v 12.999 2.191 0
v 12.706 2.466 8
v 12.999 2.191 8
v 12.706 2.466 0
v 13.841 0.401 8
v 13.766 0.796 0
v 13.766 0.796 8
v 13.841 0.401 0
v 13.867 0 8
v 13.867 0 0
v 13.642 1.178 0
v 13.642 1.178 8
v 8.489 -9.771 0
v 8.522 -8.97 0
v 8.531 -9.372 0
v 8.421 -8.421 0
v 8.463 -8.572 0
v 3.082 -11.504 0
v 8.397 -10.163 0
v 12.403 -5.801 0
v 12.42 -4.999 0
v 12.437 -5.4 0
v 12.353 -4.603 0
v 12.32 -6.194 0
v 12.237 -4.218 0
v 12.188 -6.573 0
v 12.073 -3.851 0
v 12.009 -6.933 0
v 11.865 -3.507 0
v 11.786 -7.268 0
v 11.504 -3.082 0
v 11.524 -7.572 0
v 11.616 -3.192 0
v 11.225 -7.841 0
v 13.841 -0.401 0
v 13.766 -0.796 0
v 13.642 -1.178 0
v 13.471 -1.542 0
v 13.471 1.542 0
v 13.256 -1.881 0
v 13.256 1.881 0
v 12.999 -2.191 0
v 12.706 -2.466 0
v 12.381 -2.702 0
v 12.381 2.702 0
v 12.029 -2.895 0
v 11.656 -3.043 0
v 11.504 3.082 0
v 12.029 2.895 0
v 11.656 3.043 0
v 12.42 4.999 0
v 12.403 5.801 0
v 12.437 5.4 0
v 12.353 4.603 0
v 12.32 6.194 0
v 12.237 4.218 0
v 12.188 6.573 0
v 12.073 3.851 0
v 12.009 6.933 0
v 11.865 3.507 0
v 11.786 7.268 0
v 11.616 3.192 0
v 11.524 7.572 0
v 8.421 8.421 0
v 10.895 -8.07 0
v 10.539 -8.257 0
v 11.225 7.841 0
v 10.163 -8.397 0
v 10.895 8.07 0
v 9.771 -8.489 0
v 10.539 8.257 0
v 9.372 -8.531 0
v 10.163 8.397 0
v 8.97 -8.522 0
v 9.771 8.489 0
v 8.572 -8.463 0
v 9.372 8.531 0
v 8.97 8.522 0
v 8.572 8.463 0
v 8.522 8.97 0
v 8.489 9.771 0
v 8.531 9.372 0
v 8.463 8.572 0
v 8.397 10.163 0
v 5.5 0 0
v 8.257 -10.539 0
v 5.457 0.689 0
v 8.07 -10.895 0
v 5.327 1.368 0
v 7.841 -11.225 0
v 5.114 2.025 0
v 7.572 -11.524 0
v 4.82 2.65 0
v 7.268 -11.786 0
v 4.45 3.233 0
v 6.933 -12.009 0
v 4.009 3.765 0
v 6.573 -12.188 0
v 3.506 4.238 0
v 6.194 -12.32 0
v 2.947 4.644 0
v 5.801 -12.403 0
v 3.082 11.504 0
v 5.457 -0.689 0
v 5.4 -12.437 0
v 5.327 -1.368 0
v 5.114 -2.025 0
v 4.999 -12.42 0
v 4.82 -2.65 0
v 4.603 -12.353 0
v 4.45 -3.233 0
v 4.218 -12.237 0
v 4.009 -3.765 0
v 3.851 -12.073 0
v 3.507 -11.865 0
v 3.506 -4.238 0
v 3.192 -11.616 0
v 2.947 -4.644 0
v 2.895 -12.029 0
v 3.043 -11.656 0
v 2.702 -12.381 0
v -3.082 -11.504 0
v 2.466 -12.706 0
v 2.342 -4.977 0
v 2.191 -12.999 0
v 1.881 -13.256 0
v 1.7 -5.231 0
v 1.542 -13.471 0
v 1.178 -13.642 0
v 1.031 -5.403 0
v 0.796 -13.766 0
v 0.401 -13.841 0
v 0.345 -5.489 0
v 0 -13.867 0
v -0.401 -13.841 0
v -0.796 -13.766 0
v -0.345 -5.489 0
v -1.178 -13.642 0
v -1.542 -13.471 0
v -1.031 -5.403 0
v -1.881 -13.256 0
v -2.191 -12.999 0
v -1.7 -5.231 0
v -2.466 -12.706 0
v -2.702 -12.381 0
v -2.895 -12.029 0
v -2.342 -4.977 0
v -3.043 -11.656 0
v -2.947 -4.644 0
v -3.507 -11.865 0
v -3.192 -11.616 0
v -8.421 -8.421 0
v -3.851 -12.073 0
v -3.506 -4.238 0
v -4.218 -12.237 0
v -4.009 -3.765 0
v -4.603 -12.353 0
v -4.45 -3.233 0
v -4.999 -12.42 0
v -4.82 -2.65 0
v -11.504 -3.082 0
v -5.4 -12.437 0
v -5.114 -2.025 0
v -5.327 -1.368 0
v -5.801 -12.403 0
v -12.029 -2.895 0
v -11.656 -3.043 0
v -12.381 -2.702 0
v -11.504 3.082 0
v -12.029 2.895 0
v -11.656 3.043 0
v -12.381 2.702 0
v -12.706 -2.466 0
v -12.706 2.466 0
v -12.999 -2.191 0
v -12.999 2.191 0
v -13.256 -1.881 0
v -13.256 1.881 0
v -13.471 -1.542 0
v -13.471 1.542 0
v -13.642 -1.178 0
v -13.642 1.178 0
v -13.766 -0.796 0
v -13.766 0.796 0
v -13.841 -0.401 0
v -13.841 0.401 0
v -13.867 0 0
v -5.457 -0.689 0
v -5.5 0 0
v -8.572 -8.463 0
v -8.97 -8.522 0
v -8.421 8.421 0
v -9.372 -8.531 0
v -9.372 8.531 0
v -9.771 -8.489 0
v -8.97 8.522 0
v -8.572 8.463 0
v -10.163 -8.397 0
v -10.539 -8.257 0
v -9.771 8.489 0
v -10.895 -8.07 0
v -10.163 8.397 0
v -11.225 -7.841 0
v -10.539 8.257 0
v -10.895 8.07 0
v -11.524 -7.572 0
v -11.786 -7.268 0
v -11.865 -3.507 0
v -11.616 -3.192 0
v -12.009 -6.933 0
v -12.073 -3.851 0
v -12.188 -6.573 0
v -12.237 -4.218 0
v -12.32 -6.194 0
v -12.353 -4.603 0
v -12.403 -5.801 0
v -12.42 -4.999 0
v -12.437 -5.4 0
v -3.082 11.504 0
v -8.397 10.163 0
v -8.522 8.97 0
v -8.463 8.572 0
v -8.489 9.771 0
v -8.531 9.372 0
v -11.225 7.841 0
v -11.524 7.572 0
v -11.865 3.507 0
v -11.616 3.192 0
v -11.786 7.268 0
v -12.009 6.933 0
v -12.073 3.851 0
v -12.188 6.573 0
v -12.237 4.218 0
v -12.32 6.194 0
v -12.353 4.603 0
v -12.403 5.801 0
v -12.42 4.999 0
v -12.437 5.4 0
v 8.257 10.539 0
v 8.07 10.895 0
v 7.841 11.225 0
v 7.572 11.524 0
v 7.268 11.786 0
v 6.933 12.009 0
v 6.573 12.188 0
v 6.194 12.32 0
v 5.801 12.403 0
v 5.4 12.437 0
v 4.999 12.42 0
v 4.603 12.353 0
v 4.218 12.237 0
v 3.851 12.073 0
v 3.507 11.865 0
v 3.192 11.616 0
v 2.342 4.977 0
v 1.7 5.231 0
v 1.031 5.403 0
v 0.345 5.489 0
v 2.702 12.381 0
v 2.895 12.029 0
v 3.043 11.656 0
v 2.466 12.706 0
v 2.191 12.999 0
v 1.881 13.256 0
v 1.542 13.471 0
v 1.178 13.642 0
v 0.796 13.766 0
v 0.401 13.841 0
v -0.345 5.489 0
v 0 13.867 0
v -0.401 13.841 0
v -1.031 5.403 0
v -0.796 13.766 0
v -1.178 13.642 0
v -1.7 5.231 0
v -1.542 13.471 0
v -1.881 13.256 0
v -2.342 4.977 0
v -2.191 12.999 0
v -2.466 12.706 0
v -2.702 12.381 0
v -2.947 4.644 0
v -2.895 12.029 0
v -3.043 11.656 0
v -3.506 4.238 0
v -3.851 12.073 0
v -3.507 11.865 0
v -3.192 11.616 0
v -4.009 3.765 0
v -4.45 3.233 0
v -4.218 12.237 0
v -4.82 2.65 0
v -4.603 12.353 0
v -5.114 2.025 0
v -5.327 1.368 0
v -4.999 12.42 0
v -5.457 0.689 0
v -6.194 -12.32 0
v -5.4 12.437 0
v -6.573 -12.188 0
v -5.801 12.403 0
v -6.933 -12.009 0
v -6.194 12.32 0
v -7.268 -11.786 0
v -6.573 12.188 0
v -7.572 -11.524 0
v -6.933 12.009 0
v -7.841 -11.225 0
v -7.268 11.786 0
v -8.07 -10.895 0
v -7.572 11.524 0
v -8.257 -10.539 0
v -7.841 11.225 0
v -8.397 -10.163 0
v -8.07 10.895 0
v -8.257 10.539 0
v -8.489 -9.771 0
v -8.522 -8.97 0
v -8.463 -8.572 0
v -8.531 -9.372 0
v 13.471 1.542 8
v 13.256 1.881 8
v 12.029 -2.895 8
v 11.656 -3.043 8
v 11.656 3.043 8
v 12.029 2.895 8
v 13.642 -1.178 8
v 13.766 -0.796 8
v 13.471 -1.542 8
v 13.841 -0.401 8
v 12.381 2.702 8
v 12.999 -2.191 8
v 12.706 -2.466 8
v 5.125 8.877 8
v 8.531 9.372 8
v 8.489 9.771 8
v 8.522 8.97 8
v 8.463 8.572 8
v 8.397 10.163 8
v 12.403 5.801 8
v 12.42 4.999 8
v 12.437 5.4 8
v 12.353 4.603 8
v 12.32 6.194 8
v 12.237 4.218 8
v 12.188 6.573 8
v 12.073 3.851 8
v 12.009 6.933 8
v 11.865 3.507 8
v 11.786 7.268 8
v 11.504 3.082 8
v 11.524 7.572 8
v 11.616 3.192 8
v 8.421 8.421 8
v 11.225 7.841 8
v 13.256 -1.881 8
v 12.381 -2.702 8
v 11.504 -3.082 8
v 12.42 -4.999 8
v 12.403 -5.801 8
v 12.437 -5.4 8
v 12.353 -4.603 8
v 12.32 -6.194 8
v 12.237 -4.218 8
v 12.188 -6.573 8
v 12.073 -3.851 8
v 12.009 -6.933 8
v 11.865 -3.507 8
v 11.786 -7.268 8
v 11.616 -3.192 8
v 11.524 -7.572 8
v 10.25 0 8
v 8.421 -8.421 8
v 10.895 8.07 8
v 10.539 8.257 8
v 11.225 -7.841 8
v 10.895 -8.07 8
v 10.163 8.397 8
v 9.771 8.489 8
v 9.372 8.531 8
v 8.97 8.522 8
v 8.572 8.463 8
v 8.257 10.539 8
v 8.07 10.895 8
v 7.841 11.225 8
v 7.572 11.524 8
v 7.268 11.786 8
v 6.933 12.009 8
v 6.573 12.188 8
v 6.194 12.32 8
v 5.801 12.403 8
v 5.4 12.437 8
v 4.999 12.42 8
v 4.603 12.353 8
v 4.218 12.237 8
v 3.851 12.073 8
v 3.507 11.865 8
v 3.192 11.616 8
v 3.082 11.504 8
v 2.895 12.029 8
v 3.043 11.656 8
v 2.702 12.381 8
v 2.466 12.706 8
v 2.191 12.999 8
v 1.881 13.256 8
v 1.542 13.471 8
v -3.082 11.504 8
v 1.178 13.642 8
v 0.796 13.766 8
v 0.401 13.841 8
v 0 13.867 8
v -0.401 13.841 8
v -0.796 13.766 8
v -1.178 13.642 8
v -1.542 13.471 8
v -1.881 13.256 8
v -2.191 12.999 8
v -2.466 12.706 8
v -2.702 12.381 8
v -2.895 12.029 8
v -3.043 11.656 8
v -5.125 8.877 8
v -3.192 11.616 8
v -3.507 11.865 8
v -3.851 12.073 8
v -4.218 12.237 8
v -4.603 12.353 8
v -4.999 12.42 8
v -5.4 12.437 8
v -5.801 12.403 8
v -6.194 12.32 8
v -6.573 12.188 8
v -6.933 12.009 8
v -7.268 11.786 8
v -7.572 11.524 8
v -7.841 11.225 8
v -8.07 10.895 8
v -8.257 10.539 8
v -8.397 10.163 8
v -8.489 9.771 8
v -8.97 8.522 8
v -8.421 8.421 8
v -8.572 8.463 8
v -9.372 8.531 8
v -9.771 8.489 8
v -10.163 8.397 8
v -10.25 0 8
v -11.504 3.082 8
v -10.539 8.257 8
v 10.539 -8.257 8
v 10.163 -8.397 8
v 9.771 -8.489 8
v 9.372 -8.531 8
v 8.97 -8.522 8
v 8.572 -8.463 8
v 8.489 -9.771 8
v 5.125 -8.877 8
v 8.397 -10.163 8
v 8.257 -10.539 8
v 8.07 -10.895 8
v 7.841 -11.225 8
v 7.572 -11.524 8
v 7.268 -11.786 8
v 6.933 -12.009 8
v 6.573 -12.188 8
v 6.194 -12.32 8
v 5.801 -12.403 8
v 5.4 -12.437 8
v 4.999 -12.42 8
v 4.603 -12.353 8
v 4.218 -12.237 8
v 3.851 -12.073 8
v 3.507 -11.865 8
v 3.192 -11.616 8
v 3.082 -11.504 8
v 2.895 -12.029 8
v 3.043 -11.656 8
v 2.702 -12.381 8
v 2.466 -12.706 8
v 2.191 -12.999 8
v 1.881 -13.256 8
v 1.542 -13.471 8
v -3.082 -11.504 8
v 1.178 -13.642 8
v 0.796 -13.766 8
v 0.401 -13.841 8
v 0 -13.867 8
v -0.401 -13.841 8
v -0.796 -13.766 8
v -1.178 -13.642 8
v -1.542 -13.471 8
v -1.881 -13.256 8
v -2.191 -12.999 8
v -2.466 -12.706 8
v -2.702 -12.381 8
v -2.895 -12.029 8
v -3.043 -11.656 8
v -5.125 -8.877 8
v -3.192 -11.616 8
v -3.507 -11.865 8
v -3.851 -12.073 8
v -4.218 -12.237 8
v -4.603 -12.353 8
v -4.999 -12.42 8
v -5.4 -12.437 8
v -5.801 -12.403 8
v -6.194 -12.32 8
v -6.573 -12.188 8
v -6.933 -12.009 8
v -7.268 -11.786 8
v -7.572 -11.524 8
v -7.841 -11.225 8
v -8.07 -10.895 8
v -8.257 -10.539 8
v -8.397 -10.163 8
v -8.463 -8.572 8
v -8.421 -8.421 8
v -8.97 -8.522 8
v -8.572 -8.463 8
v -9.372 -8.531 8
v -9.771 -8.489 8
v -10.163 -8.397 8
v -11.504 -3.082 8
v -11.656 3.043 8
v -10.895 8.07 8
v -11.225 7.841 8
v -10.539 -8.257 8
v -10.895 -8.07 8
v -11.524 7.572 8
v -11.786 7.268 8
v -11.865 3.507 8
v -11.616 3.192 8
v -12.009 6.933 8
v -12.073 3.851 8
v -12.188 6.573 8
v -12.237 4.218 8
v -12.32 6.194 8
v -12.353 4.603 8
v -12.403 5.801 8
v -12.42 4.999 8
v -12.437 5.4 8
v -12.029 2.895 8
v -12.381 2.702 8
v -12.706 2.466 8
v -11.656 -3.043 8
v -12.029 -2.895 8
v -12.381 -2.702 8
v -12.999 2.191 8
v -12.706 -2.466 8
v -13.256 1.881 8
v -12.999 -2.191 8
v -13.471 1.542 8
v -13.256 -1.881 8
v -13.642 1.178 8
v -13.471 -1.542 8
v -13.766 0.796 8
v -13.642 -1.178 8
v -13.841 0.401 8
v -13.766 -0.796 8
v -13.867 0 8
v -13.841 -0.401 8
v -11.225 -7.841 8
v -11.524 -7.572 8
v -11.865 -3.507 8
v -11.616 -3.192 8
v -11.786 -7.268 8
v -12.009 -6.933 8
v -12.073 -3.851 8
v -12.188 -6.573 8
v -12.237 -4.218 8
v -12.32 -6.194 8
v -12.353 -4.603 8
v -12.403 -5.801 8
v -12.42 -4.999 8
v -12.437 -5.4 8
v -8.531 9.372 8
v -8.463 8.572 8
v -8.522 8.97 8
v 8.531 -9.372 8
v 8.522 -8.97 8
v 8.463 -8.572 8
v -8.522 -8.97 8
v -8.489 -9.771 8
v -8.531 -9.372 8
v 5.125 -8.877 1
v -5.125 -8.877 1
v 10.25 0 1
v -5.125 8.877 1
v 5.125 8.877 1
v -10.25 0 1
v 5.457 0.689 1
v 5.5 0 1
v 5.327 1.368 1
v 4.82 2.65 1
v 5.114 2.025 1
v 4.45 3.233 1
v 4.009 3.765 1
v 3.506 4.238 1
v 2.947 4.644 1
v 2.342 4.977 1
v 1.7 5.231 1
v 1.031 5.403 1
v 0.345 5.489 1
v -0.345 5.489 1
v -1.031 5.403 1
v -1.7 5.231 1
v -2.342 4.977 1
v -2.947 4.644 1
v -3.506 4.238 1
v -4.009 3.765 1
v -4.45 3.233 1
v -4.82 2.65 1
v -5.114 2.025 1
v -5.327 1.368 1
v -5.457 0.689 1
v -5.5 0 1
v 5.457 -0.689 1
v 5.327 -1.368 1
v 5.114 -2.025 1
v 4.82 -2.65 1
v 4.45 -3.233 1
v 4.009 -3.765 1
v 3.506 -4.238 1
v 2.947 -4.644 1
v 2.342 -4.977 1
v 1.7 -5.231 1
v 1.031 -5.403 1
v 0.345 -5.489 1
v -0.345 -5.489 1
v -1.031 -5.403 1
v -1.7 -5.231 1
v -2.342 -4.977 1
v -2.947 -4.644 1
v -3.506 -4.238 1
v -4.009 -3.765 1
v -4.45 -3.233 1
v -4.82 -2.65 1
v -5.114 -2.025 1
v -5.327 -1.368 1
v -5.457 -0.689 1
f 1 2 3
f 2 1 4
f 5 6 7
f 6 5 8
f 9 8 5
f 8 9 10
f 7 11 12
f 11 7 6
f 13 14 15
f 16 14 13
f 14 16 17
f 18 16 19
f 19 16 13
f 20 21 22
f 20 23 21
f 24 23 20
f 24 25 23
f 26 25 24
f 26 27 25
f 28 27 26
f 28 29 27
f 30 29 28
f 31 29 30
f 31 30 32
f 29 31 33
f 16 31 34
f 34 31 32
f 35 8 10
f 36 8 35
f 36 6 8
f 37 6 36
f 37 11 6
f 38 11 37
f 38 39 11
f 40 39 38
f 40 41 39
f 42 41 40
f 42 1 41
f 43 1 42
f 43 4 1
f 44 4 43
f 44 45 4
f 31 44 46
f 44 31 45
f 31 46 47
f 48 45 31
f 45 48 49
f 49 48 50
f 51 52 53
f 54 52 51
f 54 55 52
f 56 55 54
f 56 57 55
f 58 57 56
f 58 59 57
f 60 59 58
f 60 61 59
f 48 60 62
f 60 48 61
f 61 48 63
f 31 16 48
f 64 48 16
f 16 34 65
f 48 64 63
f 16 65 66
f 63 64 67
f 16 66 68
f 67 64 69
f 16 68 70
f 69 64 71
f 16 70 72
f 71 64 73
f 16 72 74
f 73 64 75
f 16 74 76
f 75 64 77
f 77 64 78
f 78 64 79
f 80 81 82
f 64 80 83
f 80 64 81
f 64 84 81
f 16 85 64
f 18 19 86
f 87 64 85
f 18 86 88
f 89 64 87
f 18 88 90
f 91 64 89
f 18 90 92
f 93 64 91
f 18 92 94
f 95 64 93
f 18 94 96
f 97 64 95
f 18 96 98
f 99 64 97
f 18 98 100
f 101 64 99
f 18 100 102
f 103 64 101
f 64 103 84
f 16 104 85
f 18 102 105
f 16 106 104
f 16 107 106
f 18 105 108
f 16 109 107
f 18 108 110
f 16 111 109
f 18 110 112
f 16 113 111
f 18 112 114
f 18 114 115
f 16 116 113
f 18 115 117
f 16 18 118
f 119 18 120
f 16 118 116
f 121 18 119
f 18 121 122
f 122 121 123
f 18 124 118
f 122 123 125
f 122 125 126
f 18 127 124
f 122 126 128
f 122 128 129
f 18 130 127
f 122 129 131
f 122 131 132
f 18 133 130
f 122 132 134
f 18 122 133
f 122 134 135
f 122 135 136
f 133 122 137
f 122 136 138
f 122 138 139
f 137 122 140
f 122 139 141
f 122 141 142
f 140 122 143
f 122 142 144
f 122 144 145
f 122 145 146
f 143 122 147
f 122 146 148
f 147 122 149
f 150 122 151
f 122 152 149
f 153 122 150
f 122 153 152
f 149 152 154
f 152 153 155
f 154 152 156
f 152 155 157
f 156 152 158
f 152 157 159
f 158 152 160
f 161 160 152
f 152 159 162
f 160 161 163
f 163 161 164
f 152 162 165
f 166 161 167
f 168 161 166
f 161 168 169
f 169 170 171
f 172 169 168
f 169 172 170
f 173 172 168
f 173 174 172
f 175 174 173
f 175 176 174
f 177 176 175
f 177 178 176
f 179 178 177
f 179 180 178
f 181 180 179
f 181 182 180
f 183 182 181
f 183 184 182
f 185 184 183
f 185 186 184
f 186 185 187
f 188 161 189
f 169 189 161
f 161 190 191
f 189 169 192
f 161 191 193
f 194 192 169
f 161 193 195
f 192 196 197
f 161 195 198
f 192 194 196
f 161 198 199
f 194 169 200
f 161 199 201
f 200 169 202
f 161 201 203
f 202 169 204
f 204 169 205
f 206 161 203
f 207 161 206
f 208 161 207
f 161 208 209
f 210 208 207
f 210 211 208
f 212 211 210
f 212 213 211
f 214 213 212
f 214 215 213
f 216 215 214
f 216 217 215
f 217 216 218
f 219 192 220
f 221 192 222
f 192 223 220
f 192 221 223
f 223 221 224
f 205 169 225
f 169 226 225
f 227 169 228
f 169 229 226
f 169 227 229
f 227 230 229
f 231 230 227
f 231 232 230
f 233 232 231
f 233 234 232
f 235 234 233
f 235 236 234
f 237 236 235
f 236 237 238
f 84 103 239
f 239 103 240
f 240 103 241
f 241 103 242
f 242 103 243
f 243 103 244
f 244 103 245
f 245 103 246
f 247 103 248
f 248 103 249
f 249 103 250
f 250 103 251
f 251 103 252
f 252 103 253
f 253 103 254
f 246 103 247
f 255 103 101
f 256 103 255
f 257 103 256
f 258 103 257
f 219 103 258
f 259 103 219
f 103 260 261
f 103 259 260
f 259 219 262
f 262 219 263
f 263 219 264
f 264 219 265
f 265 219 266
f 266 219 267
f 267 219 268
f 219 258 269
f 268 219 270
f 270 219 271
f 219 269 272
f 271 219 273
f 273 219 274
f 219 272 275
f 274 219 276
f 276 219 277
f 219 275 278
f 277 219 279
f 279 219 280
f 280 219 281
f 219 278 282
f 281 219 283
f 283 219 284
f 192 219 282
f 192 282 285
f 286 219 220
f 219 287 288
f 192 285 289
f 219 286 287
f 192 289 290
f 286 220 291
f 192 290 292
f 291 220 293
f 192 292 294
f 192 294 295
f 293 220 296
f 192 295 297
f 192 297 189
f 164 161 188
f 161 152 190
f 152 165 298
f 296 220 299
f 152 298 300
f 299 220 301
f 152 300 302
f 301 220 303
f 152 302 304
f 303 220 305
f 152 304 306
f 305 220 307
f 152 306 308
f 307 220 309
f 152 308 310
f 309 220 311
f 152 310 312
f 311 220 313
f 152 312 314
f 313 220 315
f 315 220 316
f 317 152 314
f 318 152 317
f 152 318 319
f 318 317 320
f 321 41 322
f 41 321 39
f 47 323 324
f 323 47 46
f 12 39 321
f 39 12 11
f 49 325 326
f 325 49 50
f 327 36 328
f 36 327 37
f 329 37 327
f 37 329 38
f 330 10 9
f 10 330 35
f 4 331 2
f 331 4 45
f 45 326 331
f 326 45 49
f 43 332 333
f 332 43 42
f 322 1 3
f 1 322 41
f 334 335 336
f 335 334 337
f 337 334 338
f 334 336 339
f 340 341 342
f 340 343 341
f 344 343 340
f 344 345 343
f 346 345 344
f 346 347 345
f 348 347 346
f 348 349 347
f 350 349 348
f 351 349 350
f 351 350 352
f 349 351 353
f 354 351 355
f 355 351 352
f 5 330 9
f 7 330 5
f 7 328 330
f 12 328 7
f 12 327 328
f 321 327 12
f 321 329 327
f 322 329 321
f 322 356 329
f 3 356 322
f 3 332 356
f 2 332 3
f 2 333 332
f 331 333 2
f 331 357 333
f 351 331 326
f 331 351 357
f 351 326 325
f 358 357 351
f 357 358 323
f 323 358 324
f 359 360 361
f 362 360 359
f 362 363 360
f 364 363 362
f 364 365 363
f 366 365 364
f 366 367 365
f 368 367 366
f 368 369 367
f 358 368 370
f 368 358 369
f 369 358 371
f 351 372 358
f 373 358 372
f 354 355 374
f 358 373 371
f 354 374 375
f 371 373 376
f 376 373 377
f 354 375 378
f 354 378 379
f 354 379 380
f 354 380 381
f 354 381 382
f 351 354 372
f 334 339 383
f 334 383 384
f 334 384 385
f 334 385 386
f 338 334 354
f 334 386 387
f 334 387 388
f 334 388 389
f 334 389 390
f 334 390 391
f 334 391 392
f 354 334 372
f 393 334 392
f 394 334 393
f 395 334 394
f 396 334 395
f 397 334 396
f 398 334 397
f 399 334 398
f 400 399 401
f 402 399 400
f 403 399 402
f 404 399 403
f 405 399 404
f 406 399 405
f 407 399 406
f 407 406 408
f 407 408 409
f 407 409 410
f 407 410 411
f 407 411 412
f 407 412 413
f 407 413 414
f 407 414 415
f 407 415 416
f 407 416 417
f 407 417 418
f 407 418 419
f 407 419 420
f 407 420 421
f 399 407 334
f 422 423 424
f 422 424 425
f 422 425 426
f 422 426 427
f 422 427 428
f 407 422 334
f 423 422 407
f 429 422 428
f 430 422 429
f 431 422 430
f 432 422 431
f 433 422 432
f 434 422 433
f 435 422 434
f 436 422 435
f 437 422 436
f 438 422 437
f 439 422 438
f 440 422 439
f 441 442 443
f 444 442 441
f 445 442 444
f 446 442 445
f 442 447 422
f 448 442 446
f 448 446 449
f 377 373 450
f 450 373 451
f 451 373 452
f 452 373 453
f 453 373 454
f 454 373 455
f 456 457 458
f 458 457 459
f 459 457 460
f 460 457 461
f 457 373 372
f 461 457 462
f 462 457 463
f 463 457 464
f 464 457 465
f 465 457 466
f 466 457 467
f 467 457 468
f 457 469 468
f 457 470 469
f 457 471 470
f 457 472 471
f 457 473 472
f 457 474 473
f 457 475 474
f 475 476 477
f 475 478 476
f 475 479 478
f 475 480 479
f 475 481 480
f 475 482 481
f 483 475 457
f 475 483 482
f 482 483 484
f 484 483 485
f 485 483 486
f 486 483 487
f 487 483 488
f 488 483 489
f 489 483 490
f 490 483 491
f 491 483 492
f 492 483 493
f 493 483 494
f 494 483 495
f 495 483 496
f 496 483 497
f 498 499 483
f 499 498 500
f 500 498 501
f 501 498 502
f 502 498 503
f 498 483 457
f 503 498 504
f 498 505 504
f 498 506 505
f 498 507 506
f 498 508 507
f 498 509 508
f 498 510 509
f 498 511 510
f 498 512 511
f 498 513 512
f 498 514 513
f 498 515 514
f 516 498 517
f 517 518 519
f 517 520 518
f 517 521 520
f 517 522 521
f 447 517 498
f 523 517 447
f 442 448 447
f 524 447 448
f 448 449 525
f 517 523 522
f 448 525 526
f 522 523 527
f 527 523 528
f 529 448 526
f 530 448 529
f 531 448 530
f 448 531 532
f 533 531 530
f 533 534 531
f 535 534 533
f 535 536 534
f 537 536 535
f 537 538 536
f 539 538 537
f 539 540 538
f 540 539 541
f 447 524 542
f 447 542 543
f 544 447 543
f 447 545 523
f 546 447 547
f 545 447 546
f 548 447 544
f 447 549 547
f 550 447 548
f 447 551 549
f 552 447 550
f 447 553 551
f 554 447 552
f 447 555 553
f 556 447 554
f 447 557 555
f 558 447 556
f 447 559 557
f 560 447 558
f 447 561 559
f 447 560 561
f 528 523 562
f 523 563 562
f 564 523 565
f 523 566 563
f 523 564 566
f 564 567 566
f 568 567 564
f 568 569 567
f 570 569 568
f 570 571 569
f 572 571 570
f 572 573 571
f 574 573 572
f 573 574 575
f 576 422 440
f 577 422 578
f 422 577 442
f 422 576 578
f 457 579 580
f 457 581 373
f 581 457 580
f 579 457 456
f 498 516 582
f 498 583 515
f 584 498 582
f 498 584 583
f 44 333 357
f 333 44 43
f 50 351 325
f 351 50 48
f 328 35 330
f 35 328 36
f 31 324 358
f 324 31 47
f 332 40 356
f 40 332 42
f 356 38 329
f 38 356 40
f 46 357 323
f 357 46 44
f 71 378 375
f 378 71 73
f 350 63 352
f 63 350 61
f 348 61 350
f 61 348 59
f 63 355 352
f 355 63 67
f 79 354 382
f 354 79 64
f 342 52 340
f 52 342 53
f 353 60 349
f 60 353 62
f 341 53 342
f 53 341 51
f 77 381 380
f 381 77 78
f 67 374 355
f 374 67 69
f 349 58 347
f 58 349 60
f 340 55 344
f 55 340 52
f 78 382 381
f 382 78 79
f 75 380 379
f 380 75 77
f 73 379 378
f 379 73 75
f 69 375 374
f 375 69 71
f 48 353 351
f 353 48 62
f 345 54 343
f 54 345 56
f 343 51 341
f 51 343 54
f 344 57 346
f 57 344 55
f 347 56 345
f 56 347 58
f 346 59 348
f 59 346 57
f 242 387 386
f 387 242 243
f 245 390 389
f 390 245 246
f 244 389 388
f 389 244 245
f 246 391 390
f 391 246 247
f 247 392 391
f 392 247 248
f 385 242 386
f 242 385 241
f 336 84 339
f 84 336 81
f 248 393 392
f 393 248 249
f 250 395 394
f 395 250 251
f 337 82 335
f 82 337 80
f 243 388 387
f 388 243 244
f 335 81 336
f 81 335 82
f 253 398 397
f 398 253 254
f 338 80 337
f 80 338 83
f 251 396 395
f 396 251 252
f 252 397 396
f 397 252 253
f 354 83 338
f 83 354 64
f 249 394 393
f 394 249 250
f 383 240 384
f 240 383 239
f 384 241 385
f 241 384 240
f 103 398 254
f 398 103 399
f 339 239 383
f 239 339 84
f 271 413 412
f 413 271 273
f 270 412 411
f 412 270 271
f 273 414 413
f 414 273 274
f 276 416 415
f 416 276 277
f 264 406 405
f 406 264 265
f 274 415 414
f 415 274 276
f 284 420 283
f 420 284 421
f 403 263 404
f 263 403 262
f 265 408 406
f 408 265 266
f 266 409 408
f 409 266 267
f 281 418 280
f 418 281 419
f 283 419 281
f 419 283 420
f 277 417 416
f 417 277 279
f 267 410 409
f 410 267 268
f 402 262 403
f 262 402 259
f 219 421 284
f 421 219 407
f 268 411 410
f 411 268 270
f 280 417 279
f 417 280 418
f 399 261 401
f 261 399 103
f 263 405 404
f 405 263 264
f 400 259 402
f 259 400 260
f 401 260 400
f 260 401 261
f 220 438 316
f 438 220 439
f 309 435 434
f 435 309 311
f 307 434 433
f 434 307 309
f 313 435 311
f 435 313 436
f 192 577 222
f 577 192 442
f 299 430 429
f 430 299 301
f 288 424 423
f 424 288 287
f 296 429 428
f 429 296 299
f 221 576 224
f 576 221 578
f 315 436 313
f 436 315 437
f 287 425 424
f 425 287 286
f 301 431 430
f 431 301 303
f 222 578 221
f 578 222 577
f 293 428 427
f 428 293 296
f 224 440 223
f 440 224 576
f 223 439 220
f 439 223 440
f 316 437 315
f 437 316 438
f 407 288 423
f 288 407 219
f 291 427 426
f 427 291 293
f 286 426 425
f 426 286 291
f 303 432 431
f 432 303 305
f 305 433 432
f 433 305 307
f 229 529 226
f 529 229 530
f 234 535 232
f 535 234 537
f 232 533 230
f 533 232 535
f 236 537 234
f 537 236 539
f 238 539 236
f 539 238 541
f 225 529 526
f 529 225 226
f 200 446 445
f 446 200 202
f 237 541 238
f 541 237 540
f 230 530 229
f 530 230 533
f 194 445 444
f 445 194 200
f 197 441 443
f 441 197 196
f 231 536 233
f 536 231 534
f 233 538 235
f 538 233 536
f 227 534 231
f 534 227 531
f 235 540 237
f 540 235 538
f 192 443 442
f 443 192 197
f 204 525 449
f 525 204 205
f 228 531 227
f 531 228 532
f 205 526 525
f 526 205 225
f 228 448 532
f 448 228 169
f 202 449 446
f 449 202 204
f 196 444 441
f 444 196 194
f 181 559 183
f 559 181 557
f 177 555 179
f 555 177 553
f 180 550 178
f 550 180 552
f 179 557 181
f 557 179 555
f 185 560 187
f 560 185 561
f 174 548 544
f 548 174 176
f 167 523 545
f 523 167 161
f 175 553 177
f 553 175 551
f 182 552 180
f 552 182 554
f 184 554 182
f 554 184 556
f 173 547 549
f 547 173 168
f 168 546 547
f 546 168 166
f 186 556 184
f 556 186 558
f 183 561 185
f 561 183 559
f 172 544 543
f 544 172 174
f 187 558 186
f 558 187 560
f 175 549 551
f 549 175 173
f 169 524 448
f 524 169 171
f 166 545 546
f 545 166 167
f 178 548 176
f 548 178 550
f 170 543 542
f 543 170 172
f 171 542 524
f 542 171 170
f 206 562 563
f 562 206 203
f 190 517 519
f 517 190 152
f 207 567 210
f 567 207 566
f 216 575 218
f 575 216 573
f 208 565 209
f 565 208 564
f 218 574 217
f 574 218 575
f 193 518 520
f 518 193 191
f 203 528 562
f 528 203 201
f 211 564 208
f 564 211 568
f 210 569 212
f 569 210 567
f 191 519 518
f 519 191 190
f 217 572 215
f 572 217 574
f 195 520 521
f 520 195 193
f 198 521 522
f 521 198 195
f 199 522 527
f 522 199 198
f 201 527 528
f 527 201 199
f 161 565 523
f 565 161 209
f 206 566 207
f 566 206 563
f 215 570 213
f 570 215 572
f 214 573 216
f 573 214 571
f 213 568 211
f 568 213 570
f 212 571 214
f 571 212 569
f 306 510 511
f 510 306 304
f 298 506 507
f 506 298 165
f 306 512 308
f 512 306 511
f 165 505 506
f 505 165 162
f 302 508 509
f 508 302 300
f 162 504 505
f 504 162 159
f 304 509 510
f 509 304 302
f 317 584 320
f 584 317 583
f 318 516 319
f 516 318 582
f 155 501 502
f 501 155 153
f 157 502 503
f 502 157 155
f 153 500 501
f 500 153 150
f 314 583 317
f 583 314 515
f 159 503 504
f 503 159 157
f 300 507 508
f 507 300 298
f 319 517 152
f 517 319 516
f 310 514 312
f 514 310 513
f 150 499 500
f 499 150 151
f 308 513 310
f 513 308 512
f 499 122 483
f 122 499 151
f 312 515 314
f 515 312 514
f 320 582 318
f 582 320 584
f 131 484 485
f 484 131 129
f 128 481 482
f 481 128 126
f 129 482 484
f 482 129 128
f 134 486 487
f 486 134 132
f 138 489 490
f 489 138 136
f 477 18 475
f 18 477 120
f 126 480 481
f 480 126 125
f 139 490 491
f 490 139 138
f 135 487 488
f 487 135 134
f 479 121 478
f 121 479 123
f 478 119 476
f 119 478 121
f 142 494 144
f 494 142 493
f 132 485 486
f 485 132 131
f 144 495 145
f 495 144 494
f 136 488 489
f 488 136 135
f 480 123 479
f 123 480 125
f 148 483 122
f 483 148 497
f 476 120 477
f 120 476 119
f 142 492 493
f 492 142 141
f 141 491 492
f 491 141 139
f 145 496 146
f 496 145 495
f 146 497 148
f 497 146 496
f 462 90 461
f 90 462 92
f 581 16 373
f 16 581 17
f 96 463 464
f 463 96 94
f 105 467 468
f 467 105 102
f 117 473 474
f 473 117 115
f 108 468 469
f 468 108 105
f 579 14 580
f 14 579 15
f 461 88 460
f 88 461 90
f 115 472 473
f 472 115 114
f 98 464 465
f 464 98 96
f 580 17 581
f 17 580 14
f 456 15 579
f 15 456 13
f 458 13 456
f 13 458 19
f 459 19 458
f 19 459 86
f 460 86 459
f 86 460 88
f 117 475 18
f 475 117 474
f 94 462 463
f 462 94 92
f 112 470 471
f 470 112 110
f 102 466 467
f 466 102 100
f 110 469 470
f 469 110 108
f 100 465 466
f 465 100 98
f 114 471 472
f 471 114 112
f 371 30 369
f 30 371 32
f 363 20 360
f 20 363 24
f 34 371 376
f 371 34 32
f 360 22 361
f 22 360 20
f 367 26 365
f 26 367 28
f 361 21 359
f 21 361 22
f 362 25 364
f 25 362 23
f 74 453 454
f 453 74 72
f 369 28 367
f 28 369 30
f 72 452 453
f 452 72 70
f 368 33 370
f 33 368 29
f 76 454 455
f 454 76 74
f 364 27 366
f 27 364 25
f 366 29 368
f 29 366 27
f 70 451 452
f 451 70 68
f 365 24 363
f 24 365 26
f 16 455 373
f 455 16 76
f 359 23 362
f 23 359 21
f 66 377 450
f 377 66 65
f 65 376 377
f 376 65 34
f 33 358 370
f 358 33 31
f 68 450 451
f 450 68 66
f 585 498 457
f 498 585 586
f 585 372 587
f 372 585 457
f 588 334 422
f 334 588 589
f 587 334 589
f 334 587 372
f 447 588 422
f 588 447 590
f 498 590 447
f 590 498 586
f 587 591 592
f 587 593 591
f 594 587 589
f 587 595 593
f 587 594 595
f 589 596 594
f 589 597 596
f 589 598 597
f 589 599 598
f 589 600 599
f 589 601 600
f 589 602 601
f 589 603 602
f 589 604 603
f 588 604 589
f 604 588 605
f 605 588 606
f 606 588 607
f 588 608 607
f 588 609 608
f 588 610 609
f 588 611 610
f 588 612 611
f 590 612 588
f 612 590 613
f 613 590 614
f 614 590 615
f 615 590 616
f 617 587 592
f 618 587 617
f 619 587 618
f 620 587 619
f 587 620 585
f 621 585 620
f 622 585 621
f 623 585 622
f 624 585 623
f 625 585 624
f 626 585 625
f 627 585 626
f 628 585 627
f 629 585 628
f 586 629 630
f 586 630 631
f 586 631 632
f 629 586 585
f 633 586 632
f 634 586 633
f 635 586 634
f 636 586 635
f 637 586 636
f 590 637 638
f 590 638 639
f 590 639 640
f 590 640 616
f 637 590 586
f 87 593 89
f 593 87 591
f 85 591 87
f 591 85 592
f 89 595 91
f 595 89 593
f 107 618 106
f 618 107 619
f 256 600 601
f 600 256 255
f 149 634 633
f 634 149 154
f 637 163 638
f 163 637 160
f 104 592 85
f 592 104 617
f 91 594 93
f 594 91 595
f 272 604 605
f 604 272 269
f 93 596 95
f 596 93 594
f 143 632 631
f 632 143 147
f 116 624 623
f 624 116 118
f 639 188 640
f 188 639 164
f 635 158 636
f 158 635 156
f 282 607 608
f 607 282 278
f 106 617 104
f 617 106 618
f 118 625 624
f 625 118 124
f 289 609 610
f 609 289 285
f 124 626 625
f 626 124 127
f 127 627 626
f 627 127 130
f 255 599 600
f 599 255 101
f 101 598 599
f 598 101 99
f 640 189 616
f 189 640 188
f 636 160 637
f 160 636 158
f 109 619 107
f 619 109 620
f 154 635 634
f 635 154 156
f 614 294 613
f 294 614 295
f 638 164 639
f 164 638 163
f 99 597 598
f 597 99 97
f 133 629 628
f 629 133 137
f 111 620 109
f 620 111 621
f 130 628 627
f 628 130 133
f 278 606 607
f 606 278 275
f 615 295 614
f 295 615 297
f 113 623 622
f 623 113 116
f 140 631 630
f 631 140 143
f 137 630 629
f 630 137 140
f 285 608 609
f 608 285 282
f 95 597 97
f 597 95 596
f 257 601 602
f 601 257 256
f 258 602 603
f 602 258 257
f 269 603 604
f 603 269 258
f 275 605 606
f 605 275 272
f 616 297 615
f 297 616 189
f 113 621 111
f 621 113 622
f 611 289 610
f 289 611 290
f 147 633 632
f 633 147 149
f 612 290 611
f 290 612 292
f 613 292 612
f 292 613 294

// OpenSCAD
NUT_SIDE = 20/2;
NUT_R = 10/2;
NUT_H = 8;
GIZMO_R = 32/3;
GIZMO_H = 8;
SCREW_R = 10/2;
TOL = 0.5;

$fn = 50;

difference () {
    union () {
        for (a = [0:30:360]) rotate ([0, 0, a]) translate ([GIZMO_R, 0, 0]) {
            cylinder(GIZMO_H, r=3.2);
        }
        cylinder(GIZMO_H, r=GIZMO_R);
    }
    translate ([0, 0, 1]) cylinder (NUT_H, r=NUT_SIDE+TOL/2, $fn=6);
    translate ([0, 0, -1]) cylinder (NUT_H, r=SCREW_R+TOL);
}
